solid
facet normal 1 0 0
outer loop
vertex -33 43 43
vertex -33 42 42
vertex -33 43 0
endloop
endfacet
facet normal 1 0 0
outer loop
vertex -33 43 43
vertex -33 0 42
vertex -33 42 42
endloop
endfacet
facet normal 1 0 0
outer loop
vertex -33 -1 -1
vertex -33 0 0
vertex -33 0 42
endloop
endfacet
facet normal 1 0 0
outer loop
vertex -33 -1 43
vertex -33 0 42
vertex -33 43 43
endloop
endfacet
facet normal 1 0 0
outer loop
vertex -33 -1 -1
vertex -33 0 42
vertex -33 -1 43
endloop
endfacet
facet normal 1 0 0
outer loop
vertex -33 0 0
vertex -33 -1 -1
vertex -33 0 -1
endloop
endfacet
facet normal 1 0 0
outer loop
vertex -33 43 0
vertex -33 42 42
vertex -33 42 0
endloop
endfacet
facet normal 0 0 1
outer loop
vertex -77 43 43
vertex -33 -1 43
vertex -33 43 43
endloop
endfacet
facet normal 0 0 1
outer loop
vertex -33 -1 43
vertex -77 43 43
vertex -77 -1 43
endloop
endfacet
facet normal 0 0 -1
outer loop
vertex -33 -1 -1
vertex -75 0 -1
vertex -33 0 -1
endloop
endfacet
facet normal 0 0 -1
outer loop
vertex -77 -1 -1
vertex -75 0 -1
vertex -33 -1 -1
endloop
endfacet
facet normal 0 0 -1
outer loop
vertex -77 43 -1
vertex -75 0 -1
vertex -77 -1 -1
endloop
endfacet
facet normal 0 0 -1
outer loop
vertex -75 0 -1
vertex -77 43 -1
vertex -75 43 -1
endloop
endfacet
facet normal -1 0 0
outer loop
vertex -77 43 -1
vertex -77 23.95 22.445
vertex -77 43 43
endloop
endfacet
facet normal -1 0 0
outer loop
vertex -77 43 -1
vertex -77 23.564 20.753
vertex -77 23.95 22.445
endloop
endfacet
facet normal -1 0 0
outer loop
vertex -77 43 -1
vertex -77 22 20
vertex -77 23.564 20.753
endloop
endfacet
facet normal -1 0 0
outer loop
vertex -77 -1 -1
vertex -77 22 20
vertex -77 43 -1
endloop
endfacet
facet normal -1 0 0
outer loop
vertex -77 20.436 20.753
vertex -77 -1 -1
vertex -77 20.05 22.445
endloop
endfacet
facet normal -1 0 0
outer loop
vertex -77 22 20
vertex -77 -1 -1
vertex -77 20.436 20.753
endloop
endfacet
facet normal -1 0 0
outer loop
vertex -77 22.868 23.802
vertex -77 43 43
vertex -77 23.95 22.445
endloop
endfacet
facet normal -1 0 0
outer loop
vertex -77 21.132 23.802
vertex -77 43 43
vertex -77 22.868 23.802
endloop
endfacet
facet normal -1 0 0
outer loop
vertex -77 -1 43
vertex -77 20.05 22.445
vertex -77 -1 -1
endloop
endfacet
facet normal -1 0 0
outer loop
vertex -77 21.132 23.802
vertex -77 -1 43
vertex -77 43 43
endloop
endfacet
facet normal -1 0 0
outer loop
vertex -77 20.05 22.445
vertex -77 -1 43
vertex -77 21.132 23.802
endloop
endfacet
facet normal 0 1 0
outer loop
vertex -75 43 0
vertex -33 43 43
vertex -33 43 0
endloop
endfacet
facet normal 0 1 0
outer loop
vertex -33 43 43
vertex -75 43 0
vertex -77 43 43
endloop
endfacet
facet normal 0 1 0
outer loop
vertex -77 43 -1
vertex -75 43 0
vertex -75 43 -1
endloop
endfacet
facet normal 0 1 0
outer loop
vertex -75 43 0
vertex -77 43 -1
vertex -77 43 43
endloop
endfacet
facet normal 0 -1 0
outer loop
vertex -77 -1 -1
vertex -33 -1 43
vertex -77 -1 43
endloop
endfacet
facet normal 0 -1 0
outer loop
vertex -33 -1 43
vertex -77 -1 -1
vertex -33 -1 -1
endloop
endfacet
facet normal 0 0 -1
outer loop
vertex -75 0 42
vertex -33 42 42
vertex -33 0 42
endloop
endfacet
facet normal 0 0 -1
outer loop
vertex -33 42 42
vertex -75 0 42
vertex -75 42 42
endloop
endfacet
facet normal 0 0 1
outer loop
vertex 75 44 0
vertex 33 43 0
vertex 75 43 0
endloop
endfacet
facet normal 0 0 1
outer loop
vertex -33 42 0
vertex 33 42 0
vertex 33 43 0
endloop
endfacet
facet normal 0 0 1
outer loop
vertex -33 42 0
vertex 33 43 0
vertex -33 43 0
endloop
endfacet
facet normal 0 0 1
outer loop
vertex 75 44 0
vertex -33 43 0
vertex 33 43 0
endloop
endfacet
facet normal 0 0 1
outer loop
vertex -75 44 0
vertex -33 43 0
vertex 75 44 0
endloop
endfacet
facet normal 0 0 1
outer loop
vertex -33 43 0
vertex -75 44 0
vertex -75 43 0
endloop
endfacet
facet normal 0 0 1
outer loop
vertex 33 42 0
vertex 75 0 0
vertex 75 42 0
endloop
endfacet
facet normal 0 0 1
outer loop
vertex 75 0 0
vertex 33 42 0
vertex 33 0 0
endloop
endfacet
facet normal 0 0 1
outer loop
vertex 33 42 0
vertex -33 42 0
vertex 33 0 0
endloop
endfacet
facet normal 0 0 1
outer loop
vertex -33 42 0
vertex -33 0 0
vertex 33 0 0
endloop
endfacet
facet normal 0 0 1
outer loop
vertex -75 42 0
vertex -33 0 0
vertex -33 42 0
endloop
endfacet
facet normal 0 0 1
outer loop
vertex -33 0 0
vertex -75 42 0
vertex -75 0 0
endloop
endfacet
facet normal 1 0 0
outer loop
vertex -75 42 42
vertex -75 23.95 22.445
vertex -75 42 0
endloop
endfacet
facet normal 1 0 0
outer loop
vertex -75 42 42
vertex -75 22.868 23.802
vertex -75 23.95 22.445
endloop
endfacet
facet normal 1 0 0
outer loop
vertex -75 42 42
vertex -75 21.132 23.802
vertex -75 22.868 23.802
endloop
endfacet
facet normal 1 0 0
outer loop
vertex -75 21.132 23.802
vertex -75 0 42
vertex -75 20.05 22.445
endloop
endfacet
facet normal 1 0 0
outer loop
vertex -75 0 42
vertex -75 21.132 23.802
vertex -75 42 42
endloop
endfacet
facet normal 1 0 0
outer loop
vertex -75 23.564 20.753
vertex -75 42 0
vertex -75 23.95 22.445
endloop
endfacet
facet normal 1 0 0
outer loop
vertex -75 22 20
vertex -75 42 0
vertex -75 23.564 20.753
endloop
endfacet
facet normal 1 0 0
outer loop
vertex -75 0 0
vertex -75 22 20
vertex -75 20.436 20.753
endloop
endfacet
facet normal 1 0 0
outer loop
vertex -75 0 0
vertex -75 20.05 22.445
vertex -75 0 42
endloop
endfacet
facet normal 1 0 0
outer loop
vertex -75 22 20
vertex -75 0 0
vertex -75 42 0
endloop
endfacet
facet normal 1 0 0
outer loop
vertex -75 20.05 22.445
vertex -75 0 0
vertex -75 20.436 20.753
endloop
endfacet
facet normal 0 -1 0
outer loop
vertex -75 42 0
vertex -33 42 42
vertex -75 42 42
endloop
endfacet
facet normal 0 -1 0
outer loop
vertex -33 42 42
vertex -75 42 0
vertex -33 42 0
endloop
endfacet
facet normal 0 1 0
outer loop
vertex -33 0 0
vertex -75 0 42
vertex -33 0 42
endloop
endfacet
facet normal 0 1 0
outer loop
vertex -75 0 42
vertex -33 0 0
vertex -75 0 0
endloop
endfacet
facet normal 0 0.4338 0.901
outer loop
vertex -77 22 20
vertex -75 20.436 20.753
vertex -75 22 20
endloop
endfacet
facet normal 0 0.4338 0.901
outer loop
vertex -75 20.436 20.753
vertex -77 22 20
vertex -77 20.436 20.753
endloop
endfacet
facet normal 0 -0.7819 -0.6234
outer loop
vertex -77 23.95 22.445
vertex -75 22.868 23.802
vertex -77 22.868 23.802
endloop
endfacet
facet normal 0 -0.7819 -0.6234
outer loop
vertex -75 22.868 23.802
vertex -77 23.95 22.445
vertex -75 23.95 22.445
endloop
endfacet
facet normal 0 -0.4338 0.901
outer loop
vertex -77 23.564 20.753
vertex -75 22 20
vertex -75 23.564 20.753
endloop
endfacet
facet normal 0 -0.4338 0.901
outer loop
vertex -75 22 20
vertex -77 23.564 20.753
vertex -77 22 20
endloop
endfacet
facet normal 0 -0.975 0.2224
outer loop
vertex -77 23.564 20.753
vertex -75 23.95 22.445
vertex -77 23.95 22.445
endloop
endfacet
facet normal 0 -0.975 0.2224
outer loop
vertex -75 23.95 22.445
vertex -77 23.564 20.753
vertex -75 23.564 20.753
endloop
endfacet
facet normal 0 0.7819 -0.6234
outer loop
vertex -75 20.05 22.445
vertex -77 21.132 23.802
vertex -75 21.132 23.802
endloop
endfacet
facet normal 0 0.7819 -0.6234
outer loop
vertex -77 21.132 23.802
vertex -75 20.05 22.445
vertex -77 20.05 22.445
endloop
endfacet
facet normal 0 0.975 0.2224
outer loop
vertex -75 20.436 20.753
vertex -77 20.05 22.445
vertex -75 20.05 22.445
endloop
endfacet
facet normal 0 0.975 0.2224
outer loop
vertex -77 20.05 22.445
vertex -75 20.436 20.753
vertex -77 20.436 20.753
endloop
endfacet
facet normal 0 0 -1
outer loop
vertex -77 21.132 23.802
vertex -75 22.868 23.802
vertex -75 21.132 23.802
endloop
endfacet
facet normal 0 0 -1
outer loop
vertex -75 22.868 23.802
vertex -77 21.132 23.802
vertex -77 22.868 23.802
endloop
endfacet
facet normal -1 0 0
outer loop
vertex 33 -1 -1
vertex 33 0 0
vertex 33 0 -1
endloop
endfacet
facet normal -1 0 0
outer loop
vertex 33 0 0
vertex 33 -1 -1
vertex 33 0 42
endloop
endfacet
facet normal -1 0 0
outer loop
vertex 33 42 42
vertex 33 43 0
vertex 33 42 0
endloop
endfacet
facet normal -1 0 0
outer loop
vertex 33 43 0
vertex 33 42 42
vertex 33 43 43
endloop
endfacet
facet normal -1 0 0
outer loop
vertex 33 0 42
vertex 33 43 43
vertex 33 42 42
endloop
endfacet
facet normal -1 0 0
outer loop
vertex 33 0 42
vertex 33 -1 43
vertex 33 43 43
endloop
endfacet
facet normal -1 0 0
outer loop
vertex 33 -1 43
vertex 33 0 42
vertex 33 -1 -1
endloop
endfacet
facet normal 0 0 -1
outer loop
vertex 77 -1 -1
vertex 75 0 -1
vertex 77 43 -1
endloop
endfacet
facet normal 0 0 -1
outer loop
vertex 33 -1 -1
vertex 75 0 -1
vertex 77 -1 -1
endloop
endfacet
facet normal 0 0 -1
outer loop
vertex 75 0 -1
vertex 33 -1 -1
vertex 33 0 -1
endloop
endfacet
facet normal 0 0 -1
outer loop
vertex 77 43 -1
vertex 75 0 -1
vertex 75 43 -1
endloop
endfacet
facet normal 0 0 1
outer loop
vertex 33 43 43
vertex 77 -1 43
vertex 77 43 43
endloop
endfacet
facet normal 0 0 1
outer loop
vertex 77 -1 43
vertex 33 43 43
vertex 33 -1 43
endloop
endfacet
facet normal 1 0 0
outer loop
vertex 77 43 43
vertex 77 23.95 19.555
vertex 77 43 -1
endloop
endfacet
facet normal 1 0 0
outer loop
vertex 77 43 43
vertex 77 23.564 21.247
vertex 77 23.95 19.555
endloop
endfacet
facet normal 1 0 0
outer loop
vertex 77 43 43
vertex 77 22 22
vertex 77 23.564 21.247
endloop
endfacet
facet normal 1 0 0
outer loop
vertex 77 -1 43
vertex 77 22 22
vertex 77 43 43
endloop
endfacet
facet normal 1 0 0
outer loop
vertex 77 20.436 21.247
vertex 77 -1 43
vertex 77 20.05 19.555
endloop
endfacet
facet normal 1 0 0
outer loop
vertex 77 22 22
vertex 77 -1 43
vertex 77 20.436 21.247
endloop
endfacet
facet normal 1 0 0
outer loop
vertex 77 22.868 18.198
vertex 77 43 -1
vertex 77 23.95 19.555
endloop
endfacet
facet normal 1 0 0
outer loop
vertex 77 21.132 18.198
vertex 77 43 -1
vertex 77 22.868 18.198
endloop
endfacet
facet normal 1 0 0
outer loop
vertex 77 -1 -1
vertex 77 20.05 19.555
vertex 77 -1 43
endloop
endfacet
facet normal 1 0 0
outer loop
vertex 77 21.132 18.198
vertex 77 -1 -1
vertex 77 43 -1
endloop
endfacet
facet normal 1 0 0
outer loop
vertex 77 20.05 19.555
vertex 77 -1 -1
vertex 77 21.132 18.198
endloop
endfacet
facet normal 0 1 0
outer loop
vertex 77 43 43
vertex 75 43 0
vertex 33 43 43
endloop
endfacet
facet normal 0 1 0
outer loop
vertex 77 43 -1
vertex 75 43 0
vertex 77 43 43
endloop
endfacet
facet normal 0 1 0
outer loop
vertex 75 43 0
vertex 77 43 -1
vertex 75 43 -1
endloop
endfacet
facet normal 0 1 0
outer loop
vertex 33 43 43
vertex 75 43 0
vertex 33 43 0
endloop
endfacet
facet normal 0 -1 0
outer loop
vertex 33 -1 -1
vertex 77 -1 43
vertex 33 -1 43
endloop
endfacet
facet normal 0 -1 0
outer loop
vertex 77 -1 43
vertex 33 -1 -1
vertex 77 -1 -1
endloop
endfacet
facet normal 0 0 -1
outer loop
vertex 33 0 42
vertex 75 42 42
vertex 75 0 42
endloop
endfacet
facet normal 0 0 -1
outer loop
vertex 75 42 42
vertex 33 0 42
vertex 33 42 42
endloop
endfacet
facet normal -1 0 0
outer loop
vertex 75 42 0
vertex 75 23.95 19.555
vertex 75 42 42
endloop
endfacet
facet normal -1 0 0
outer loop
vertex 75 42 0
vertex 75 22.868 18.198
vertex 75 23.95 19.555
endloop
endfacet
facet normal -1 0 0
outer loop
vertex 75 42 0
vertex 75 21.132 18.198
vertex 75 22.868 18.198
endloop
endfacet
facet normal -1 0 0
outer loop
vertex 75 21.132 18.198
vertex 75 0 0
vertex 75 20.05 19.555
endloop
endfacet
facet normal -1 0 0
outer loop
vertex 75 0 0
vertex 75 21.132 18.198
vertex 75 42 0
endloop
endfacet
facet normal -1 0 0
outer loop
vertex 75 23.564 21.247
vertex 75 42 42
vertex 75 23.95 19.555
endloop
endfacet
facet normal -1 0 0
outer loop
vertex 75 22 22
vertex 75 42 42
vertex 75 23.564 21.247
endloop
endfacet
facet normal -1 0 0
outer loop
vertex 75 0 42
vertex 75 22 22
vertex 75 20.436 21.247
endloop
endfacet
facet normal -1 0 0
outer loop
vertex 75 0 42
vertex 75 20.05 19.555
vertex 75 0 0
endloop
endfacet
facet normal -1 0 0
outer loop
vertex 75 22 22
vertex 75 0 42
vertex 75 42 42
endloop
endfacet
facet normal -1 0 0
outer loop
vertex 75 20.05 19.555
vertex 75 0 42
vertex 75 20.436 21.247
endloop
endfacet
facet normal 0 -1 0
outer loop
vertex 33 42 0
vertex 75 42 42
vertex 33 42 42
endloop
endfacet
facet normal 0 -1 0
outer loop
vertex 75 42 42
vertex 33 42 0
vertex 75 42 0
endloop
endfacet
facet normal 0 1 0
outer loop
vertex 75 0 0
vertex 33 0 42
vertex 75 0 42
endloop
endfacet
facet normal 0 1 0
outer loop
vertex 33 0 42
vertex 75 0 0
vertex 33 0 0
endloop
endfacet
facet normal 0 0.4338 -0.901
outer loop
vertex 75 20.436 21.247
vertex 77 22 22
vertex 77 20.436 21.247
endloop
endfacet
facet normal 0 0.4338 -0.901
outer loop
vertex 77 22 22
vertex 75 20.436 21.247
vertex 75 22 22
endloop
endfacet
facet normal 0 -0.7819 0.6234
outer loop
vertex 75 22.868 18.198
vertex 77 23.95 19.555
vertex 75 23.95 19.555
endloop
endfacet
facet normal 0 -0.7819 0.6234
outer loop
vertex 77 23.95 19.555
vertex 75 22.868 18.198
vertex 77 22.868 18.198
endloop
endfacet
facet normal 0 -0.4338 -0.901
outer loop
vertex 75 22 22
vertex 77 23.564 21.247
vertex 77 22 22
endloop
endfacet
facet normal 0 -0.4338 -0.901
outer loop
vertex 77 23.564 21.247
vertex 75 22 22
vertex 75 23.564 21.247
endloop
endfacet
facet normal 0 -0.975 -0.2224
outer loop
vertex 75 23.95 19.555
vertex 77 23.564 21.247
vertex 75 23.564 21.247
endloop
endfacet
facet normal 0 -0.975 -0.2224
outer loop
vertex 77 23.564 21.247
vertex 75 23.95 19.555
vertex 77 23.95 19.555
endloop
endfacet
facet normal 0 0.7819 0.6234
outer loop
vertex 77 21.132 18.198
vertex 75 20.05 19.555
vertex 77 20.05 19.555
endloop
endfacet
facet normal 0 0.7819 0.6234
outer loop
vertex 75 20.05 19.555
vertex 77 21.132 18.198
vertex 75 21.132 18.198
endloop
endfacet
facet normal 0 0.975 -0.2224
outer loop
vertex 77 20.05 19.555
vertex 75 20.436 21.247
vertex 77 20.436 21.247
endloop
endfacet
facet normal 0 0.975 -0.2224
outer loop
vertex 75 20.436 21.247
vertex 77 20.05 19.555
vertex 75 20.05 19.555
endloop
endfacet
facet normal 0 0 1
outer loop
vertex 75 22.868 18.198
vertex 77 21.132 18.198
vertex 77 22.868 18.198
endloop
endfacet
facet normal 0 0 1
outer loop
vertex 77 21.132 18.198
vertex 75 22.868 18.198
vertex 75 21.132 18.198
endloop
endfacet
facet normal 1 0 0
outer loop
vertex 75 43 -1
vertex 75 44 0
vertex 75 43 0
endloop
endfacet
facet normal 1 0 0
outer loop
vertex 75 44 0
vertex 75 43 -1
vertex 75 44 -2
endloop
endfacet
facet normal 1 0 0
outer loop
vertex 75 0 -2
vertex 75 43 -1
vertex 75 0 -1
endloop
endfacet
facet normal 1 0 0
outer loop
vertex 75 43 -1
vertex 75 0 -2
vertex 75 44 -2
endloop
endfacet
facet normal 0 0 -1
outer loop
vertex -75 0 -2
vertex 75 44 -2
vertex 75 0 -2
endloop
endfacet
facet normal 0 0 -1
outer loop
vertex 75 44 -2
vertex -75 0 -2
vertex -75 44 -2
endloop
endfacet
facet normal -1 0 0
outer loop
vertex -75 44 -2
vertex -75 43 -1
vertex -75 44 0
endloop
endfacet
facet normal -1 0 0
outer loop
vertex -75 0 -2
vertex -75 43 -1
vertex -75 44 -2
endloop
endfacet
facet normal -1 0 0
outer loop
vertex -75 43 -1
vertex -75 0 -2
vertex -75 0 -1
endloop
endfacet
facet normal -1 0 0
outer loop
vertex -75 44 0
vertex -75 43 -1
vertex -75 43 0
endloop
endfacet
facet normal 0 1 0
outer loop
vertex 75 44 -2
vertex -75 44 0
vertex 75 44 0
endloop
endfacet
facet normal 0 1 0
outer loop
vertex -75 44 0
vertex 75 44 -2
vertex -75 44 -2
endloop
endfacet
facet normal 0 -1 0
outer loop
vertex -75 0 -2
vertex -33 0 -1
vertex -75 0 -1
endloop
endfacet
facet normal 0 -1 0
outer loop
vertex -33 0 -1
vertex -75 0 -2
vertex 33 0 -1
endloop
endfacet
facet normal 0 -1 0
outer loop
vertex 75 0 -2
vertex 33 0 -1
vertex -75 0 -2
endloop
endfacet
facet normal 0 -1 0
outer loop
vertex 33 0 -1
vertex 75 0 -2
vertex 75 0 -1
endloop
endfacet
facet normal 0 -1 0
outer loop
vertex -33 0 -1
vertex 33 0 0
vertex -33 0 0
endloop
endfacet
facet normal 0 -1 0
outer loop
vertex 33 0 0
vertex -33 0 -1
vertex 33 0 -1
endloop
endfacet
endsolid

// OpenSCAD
// Braile module encloser
// Copyright (c) Anav Mehta

module one_motor_cube()
{
  //rotate([0,90,0]) {cylinder(h=20, r=10, center=true);}
  //rotate([0,90,0]) 
    difference () {
  difference () {
      difference() {
        translate([-2,-1,-1]) cube([44,44,44]);
        cube([42,42,42]);
    }

  }
    translate([-2,22,22]) rotate([0,90,0]){cylinder(h=3,r=2);}
}
   

}

echo(version=version());

translate([-75,0,-2]) cube([150,44,2]);
translate([-75,0,0]) one_motor_cube();
translate([75,0,42]) rotate([0,180,0]) one_motor_cube();
